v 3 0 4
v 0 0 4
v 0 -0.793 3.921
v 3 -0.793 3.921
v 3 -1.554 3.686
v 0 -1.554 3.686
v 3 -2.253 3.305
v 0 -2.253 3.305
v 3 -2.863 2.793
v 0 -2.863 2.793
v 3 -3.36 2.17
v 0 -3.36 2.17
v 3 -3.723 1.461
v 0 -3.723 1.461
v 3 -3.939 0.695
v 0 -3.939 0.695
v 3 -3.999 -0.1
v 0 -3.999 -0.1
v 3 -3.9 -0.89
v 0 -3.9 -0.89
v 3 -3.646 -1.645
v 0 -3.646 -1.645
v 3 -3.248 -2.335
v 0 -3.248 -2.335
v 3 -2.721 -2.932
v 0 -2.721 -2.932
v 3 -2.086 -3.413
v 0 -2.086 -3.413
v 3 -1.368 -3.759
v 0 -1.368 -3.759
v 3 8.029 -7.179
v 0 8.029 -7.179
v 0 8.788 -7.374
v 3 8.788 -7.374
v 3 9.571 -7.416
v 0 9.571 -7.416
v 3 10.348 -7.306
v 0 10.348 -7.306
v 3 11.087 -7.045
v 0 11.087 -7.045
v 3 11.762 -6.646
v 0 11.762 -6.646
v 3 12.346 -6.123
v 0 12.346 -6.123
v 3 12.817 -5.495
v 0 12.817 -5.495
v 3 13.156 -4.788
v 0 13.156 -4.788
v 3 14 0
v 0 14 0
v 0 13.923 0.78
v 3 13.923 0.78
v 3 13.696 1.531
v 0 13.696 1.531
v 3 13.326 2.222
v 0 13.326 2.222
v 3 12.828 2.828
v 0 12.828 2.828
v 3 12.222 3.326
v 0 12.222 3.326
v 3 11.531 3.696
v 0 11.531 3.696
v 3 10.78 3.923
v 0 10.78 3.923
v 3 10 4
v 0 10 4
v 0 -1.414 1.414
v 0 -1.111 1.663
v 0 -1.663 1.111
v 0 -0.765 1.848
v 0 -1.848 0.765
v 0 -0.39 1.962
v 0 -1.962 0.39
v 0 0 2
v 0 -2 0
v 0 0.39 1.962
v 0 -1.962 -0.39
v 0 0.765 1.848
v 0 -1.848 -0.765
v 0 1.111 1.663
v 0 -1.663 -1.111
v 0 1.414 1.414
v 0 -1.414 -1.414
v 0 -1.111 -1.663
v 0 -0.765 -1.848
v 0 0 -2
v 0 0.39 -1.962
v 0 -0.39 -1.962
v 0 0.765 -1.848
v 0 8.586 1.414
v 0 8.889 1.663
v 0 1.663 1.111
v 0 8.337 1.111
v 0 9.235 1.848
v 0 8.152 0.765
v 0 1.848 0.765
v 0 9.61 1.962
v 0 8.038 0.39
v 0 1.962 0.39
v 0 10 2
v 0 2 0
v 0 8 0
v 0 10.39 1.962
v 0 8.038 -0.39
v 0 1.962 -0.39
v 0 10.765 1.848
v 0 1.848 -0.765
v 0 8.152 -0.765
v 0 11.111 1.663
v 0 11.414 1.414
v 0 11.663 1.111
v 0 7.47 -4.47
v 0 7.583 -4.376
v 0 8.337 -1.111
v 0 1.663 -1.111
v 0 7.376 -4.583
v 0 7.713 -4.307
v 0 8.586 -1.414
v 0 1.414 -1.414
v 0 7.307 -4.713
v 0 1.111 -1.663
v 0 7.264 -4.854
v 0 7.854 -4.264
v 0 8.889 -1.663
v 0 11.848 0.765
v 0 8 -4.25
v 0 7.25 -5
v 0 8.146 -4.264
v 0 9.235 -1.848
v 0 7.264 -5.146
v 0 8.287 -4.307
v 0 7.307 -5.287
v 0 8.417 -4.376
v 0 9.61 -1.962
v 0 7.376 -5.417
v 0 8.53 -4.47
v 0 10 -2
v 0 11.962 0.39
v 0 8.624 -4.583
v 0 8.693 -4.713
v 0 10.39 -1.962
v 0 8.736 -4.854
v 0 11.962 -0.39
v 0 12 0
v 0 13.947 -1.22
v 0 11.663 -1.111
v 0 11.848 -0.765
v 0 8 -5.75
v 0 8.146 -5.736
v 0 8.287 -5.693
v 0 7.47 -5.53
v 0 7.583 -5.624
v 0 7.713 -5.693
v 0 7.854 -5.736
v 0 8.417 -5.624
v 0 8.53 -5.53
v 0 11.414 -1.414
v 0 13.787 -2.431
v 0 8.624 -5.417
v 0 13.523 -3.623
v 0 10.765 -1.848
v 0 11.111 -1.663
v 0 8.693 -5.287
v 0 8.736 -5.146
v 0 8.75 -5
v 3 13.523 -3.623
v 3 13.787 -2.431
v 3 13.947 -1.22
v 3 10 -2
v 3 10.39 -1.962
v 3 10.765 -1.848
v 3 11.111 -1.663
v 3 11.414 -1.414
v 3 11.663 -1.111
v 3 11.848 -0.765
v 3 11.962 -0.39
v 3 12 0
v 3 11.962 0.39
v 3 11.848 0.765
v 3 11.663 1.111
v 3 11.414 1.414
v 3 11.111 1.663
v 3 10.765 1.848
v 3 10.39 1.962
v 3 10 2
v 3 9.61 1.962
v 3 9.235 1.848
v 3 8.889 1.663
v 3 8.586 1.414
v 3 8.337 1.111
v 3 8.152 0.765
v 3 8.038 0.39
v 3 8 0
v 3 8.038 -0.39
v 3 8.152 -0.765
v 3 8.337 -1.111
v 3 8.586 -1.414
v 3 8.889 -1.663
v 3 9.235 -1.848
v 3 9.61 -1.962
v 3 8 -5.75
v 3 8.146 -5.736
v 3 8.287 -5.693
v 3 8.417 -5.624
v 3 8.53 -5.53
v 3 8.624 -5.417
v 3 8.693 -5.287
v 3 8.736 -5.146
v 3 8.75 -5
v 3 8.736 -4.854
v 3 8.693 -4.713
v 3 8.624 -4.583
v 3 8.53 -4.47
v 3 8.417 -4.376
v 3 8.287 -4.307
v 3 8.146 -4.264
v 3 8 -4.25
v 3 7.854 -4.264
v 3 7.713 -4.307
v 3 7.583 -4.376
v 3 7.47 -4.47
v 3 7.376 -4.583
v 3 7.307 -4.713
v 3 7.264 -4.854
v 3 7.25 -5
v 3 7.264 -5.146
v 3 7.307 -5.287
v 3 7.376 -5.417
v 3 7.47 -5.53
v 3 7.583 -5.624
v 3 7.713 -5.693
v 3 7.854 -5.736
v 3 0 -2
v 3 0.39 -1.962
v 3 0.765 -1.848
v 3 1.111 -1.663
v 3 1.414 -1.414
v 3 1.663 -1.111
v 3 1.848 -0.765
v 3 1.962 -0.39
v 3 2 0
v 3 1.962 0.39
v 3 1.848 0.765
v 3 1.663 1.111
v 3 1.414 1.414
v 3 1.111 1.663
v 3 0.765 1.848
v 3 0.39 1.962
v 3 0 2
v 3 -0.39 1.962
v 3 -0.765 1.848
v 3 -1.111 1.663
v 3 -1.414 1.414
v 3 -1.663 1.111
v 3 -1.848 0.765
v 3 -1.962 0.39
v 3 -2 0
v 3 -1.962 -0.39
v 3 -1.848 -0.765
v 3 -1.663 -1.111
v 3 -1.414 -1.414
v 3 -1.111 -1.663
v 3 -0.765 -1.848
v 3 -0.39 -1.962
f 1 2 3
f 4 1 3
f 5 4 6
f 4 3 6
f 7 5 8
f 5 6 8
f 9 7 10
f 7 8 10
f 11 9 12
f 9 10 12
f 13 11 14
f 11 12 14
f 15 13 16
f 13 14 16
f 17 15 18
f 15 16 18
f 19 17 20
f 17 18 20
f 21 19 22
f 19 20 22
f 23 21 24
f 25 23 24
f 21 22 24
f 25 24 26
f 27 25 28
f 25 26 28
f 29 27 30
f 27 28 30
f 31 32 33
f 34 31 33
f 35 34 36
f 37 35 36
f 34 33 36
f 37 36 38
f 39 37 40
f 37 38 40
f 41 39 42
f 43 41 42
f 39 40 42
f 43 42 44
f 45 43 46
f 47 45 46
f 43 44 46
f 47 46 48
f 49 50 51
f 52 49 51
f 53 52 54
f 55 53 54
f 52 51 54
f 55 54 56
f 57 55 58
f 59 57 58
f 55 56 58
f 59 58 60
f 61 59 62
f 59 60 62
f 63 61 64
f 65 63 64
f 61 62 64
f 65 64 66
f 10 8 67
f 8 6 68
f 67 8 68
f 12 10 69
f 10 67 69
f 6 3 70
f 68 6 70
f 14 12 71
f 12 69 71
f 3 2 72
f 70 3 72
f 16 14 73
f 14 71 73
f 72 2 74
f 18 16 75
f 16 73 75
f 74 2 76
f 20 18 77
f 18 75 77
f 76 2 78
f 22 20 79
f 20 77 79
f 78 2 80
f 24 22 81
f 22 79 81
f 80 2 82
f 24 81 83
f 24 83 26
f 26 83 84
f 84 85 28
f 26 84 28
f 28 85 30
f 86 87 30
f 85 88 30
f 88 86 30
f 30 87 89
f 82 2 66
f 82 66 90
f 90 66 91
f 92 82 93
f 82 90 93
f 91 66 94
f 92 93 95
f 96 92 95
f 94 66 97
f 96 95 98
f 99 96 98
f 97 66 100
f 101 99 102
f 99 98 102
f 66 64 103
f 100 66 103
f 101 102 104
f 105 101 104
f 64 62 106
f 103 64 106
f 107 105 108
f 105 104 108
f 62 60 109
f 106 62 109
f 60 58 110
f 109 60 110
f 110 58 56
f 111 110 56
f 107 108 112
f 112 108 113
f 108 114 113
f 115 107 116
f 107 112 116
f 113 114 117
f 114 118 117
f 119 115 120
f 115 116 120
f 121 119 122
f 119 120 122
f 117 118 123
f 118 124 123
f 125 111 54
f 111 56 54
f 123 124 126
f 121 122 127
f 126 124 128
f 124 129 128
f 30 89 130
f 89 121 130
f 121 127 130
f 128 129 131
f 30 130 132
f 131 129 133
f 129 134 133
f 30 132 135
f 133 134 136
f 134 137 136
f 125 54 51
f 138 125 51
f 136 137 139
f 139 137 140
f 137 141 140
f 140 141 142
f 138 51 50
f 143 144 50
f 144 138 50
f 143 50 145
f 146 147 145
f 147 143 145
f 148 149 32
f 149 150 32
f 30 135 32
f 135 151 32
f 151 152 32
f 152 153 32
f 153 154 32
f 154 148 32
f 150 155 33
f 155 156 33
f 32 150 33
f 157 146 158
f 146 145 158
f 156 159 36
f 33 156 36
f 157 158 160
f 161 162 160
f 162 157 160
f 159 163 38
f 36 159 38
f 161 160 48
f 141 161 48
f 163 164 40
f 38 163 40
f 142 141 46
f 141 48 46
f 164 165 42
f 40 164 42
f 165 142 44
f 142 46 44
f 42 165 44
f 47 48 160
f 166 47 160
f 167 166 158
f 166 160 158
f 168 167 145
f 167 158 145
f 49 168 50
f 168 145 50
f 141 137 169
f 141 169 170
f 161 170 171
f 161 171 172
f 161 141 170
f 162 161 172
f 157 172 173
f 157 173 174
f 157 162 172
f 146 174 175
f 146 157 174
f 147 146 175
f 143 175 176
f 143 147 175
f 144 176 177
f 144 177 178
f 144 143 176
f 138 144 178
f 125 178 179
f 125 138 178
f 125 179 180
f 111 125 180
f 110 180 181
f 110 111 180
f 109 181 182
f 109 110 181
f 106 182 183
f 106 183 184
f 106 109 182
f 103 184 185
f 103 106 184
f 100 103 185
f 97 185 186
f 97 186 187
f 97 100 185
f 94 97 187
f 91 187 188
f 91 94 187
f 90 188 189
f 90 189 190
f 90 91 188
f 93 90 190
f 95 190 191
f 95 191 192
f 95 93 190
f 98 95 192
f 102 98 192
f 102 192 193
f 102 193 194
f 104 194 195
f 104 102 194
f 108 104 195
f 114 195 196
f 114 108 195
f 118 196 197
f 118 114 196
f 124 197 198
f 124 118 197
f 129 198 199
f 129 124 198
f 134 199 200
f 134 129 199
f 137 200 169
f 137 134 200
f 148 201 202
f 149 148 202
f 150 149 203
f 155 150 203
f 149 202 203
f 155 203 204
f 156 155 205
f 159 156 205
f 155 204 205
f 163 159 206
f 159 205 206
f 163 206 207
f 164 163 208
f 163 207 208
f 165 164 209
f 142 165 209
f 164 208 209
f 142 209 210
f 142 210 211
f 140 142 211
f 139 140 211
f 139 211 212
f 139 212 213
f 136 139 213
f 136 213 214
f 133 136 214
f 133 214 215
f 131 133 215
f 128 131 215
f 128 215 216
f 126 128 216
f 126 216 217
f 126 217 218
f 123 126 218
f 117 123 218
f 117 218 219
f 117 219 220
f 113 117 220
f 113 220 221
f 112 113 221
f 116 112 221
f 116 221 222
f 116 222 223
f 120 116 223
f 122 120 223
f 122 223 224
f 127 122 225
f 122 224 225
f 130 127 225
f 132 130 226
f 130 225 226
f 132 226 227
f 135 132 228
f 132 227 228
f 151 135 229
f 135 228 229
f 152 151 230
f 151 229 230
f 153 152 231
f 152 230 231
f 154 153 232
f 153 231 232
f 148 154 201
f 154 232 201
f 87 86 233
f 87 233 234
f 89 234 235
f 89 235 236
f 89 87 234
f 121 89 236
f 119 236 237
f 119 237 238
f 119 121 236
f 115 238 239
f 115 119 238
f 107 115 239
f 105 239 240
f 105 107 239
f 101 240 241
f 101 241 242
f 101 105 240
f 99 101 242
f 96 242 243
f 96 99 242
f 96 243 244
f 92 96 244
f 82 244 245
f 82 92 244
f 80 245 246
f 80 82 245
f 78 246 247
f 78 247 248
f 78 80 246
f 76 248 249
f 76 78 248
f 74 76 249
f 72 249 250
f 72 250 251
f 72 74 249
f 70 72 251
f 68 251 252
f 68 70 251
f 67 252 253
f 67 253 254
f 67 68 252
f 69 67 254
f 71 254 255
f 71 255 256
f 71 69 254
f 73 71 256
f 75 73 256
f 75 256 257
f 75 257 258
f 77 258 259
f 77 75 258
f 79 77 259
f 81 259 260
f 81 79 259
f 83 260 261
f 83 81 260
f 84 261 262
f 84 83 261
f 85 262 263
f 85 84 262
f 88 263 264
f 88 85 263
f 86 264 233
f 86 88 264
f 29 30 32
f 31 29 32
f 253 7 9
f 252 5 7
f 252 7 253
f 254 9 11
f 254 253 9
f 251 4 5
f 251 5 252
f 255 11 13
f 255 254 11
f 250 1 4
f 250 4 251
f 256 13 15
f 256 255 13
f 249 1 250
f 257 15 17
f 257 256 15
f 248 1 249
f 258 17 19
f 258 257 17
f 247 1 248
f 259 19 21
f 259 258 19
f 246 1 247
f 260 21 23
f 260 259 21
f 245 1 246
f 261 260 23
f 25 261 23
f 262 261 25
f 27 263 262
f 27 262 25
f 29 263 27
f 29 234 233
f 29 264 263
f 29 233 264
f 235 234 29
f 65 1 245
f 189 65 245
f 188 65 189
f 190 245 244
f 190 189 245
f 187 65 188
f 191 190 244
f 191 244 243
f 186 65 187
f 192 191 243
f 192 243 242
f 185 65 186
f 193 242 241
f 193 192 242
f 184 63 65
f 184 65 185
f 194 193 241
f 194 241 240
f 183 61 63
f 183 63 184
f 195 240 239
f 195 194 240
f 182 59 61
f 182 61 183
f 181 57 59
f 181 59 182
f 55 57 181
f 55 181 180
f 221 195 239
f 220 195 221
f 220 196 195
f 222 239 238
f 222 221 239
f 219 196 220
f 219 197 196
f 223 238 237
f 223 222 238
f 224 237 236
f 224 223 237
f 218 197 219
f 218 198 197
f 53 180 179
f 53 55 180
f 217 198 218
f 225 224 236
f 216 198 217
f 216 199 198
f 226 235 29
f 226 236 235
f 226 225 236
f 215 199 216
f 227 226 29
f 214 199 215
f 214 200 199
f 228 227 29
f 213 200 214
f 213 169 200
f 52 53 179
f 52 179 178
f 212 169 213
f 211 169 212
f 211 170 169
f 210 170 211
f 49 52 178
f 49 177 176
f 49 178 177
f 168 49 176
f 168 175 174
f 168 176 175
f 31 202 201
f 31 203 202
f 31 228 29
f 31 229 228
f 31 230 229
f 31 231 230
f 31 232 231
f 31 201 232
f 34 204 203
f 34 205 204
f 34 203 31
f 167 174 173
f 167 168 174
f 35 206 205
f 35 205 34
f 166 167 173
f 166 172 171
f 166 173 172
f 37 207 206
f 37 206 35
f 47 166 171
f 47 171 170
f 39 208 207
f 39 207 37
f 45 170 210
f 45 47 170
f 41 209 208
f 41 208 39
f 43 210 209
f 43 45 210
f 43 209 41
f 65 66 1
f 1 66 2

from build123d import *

# Parameters (mm, degrees)
SKETCH1_R           = 2
BOSS_EXTRUDE1_DEPTH = 3
SKETCH2_R           = 0.75
CUT_EXTRUDE1_DEPTH  = 17.126356976


with BuildPart() as part:
    # Sketch1 → Boss-Extrude1 (new body)
    with BuildSketch(Plane(origin=(0, 0, 0), x_dir=(0, 0, -1), z_dir=(1, 0, 0))):
        with BuildLine():
            Line((-4, 10), (-4, 0))
            ThreePointArc((-4, 0), (-0.694592711, -3.939231012), (3.758770483, -1.368080573))
            Line((3.758770483, -1.368080573), (7.178971916, 8.028845635))
            ThreePointArc((7.178971916, 8.028845635), (7.045432581, 11.087399255), (4.788282007, 13.155696691))
            ThreePointArc((4.788282007, 13.155696691), (2.431074487, 13.787308542), (0, 14))
            ThreePointArc((0, 14), (-2.828427125, 12.828427125), (-4, 10))
        make_face()
        Circle(SKETCH1_R, mode=Mode.SUBTRACT)
        with Locations((0, 10)):
            Circle(SKETCH1_R, mode=Mode.SUBTRACT)
    extrude(amount=BOSS_EXTRUDE1_DEPTH)

    # Sketch2 → Cut-Extrude1 (cut, through all)
    with BuildSketch(Plane(origin=(3, 0, 0), x_dir=(0, 0, -1), z_dir=(1, 0, 0))):
        with Locations((5, 8)):
            Circle(SKETCH2_R)
    extrude(amount=-CUT_EXTRUDE1_DEPTH, mode=Mode.SUBTRACT)


solid = part.part
